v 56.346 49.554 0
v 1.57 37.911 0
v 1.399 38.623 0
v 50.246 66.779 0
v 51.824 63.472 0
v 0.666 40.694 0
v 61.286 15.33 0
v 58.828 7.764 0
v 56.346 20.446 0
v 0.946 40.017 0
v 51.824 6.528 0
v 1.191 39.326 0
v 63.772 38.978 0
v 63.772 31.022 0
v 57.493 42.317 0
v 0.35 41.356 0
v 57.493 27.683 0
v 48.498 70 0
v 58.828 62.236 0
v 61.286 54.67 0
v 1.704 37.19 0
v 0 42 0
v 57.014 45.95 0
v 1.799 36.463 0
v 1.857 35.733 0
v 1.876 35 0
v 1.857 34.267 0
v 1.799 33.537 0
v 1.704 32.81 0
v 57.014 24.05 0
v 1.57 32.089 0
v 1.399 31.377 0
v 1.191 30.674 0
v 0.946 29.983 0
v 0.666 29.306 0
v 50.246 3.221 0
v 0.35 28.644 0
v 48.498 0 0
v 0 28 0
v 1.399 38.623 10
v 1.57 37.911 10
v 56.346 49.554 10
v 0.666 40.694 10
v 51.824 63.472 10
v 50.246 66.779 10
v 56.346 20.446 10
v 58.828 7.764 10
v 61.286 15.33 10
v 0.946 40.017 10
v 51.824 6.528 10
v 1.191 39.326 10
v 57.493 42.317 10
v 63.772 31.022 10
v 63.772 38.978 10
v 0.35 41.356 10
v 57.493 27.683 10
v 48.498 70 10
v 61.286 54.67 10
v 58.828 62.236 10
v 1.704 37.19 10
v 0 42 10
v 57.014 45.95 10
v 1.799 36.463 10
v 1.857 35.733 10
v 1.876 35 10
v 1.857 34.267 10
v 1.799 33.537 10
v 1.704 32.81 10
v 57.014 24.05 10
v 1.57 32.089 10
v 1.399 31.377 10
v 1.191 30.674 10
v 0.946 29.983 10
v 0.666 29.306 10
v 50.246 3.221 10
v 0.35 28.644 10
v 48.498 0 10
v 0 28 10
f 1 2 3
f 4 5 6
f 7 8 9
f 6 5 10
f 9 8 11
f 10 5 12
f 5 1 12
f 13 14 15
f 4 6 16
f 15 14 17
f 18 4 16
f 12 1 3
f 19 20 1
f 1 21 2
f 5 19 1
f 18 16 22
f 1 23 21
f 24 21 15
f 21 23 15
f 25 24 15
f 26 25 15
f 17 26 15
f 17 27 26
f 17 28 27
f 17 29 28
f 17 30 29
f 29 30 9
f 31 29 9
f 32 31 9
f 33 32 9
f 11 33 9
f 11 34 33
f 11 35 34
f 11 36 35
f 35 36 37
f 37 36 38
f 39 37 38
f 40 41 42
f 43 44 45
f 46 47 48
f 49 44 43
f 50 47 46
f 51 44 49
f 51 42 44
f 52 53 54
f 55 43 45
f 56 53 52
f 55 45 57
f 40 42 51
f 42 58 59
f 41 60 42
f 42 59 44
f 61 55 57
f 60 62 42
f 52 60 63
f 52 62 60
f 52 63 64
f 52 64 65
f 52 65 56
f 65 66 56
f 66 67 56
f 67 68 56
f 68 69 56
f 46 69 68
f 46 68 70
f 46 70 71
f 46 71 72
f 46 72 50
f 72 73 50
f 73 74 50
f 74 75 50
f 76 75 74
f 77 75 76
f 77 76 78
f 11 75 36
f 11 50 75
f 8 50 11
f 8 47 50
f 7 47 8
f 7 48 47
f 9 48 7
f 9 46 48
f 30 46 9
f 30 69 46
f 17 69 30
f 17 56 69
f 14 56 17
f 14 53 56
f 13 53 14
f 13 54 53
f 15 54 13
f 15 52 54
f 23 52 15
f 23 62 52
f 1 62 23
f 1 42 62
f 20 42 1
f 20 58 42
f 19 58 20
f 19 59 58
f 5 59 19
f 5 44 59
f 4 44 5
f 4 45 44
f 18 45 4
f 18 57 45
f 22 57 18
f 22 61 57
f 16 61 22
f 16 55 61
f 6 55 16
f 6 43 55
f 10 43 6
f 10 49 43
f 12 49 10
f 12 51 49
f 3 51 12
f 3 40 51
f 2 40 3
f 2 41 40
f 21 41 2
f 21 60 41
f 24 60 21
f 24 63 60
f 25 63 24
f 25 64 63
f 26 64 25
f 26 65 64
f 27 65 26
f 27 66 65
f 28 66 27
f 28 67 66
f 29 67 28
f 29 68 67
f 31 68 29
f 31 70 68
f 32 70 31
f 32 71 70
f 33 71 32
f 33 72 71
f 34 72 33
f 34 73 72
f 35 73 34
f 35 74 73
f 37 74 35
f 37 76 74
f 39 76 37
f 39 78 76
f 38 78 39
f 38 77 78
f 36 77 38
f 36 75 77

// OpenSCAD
$fn = 32;

// ----------------------------------------------------------------------
// Gear sector: 3 teeth on 60 degrees
// ----------------------------------------------------------------------

// --- parameters (mm) ---
sector_angle = 60;        // sector angle, degrees
root_r = 70;              // root circle radius
tooth_h = 6;              // tooth height over the root circle
teeth = 3;                // number of teeth on the sector
hub_r = 14;               // hub bore radius
plate_t = 10;             // sector thickness, Z
arc_step = 3;             // sampling step of the root/hub arcs, degrees

tip_r = root_r + tooth_h;  // tip circle radius

profile = [[48.498, 0], [50.246, 3.221], [51.824, 6.528], [58.828, 7.764], [61.286, 15.33], [56.346, 20.446], [57.014, 24.05], [57.493, 27.683], [63.772, 31.022], [63.772, 38.978], [57.493, 42.317], [57.014, 45.95], [56.346, 49.554], [61.286, 54.67], [58.828, 62.236], [51.824, 63.472], [50.246, 66.779], [48.498, 70], [0, 42], [0.35, 41.356], [0.666, 40.694], [0.946, 40.017], [1.191, 39.326], [1.399, 38.623], [1.57, 37.911], [1.704, 37.19], [1.799, 36.463], [1.857, 35.733], [1.876, 35], [1.857, 34.267], [1.799, 33.537], [1.704, 32.81], [1.57, 32.089], [1.399, 31.377], [1.191, 30.674], [0.946, 29.983], [0.666, 29.306], [0.35, 28.644], [0, 28]];  // primary outline, 39 points, counter clockwise

// --- the one profile operation ---
linear_extrude(height = plate_t) polygon(points = profile);
